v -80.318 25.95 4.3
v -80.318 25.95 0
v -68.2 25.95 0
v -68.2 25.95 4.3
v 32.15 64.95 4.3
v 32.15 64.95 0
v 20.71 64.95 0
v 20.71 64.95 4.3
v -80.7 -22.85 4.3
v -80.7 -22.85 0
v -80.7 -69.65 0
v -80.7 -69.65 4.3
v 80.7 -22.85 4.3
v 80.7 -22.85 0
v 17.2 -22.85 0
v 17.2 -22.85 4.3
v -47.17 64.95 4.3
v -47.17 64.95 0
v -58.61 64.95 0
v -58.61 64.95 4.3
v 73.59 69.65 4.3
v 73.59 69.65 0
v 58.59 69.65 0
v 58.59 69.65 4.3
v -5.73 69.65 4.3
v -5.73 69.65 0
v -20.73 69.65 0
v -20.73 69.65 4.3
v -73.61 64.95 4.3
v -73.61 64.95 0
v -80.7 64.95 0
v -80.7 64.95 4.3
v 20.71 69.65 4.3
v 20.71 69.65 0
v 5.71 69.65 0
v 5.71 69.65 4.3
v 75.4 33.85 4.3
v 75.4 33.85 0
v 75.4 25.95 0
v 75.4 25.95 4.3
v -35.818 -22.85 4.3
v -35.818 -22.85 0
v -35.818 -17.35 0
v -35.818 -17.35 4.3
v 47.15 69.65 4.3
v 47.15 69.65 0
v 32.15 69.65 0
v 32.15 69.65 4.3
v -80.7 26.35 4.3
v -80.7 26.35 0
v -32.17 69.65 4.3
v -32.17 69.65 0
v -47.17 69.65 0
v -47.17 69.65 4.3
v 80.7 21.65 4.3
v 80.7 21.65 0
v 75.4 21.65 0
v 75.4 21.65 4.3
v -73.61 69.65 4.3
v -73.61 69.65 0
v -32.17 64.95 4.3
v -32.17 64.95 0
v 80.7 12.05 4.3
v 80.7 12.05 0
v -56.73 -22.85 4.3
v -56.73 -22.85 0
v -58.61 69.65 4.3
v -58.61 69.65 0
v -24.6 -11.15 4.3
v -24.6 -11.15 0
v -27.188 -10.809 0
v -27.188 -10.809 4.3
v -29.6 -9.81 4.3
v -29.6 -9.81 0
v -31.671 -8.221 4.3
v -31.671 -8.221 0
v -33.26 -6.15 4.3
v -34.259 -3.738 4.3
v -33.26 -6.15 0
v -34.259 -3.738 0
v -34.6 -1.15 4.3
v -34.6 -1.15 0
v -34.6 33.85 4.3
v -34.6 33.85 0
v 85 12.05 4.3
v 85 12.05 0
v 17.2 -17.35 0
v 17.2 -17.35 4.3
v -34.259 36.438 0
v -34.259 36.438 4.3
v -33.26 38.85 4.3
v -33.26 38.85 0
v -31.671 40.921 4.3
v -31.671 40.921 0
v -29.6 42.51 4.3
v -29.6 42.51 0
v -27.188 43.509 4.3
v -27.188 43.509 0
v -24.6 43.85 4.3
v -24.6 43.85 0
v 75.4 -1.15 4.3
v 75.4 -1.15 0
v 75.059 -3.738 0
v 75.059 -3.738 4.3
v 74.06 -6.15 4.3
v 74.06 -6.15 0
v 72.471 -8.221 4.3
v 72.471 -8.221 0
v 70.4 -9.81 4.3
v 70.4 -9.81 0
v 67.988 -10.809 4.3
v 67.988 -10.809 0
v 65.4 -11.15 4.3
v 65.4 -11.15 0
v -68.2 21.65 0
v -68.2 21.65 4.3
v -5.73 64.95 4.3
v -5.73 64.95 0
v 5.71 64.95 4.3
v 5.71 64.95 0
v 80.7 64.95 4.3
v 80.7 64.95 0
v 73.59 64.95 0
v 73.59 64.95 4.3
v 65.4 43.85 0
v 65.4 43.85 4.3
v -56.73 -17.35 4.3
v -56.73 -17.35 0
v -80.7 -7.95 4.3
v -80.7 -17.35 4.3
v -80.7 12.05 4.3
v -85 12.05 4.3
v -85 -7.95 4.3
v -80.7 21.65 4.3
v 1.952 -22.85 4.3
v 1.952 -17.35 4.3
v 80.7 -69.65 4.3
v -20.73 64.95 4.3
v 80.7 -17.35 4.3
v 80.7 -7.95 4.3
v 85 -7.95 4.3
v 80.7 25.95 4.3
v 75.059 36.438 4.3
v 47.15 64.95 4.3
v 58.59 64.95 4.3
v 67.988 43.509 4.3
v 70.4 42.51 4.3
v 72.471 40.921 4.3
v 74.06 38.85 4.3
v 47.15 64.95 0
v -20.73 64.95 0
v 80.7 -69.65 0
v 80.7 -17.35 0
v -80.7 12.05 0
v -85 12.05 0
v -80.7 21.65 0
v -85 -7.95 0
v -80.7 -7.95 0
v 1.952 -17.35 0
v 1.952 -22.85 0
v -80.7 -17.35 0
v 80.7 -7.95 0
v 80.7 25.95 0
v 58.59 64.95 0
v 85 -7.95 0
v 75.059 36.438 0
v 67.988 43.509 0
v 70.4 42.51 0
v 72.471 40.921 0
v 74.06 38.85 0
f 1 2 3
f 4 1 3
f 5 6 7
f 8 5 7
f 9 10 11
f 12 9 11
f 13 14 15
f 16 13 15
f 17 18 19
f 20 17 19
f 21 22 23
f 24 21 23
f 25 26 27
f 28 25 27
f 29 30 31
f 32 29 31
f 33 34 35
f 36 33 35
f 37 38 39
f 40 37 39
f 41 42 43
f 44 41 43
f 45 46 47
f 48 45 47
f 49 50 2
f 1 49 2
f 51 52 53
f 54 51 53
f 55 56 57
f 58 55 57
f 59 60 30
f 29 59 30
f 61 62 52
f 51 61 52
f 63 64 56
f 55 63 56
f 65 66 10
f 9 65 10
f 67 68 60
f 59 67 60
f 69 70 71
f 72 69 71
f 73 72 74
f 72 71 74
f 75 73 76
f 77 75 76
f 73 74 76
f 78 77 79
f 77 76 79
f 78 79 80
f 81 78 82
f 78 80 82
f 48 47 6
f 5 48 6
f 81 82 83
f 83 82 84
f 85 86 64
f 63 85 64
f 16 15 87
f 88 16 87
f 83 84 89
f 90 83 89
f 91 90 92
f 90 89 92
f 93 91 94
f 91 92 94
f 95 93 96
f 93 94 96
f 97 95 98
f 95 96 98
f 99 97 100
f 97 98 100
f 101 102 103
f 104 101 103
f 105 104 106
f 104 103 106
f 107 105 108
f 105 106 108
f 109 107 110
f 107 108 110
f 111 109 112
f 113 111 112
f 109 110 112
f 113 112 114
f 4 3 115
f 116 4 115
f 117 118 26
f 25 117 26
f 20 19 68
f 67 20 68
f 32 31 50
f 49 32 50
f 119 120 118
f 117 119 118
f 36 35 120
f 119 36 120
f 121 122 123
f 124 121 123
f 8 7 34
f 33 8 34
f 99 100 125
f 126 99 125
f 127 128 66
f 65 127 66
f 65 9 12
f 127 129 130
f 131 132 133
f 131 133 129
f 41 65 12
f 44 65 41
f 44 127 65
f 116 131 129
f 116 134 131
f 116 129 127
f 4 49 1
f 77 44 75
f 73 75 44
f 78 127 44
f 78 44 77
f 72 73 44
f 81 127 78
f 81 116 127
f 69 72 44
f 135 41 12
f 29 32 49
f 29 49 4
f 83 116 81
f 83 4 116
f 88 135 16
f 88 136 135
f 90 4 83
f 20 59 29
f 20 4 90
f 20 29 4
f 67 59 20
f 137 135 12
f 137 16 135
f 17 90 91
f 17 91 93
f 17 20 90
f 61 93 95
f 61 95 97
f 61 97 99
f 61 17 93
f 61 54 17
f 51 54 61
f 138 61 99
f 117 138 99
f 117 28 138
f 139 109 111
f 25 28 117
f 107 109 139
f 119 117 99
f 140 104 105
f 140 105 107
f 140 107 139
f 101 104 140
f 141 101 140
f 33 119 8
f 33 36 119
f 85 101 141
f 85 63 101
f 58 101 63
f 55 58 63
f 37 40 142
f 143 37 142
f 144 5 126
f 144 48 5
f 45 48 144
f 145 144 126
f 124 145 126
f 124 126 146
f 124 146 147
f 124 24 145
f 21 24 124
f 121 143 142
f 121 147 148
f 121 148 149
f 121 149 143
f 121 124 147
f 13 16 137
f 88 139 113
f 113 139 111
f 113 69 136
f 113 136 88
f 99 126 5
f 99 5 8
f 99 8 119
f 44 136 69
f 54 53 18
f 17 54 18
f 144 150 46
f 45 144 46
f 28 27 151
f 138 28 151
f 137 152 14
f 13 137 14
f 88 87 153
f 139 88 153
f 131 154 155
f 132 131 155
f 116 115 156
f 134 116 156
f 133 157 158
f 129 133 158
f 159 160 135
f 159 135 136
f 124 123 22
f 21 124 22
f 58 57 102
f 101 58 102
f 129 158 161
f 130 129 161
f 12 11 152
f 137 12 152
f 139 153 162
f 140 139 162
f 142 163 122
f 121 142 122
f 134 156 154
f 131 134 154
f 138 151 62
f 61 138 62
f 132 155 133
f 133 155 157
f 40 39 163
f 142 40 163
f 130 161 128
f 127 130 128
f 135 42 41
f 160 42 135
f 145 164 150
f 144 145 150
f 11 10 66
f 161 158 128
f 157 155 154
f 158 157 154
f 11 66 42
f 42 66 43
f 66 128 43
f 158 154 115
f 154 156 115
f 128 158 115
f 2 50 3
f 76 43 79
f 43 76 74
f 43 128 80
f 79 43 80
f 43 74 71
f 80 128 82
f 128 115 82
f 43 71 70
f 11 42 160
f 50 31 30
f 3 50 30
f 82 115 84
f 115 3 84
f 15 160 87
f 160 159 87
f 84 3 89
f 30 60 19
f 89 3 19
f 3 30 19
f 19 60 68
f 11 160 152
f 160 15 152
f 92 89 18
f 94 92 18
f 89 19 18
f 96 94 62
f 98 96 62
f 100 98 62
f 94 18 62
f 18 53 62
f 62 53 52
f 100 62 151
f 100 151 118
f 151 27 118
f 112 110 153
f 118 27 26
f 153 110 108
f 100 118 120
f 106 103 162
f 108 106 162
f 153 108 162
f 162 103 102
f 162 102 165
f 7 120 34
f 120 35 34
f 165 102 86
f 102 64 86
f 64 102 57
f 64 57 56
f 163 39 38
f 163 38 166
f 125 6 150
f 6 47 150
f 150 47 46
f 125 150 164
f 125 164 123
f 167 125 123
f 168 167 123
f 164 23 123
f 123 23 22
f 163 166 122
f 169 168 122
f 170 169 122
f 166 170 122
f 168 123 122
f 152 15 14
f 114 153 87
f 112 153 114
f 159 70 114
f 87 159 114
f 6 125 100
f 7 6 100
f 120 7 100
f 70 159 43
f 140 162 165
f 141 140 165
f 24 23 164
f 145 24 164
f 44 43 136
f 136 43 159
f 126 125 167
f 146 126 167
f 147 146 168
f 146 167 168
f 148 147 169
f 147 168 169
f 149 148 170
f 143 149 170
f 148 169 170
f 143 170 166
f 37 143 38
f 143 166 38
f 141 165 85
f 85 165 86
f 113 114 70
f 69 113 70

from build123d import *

# Parameters (mm, degrees)
SKETCH2_W           = 37.77
SKETCH2_H           = 5.5
BOSS_EXTRUDE1_DEPTH = 4.3


with BuildPart() as part:
    # Sketch2 → Boss-Extrude1 (new body)
    with BuildSketch(Plane.XY):
        with BuildLine():
            Line((-58.61, 69.65), (-73.61, 69.65))
            Line((-73.61, 69.65), (-73.61, 64.95))
            Line((-73.61, 64.95), (-80.7, 64.95))
            Line((-80.7, 64.95), (-80.7, 26.35))
            Line((-80.7, 26.35), (-80.318, 25.95))
            Line((-80.318, 25.95), (-68.2, 25.95))
            Line((-68.2, 25.95), (-68.2, 21.65))
            Line((-68.2, 21.65), (-80.7, 21.65))
            Line((-80.7, 21.65), (-80.7, 12.05))
            Line((-80.7, 12.05), (-85, 12.05))
            Line((-85, 12.05), (-85, -7.95))
            Line((-85, -7.95), (-80.7, -7.95))
            Line((-80.7, -7.95), (-80.7, -17.35))
            Line((-80.7, -17.35), (-56.729583067, -17.35))
            Line((-56.729583067, -17.35), (-56.729583067, -22.85))
            Line((-56.729583067, -22.85), (-80.7, -22.85))
            Line((-80.7, -22.85), (-80.7, -69.65))
            Line((-80.7, -69.65), (80.7, -69.65))
            Line((80.7, -69.65), (80.7, -22.85))
            Line((80.7, -22.85), (17.2, -22.85))
            Line((17.2, -22.85), (17.2, -17.35))
            Line((17.2, -17.35), (80.7, -17.35))
            Line((80.7, -17.35), (80.7, -7.95))
            Line((80.7, -7.95), (85, -7.95))
            Line((85, -7.95), (85, 12.05))
            Line((85, 12.05), (80.7, 12.05))
            Line((80.7, 12.05), (80.7, 21.65))
            Line((80.7, 21.65), (80.282, 21.65))
            Line((80.282, 21.65), (75.4, 21.65))
            Line((75.4, 21.65), (75.4, -1.15))
            ThreePointArc((75.4, -1.15), (72.471067812, -8.221067812), (65.4, -11.15))
            Line((65.4, -11.15), (-24.6, -11.15))
            ThreePointArc((-24.6, -11.15), (-31.671067812, -8.221067812), (-34.6, -1.15))
            Line((-34.6, -1.15), (-34.6, 33.85))
            ThreePointArc((-34.6, 33.85), (-31.671067812, 40.921067812), (-24.6, 43.85))
            Line((-24.6, 43.85), (65.4, 43.85))
            ThreePointArc((65.4, 43.85), (72.471067812, 40.921067812), (75.4, 33.85))
            Line((75.4, 33.85), (75.4, 25.95))
            Line((75.4, 25.95), (79.9, 25.95))
            Line((79.9, 25.95), (80.7, 25.95))
            Line((80.7, 25.95), (80.7, 64.95))
            Line((80.7, 64.95), (73.59, 64.95))
            Line((73.59, 64.95), (73.59, 69.65))
            Line((73.59, 69.65), (58.59, 69.65))
            Line((58.59, 69.65), (58.59, 64.95))
            Line((58.59, 64.95), (47.15, 64.95))
            Line((47.15, 64.95), (47.15, 69.65))
            Line((47.15, 69.65), (32.15, 69.65))
            Line((32.15, 69.65), (32.15, 64.95))
            Line((32.15, 64.95), (20.71, 64.95))
            Line((20.71, 64.95), (20.71, 69.65))
            Line((20.71, 69.65), (5.71, 69.65))
            Line((5.71, 69.65), (5.71, 64.95))
            Line((5.71, 64.95), (-5.73, 64.95))
            Line((-5.73, 64.95), (-5.73, 69.65))
            Line((-5.73, 69.65), (-20.73, 69.65))
            Line((-20.73, 69.65), (-20.73, 64.95))
            Line((-20.73, 64.95), (-32.17, 64.95))
            Line((-32.17, 64.95), (-32.17, 69.65))
            Line((-32.17, 69.65), (-47.17, 69.65))
            Line((-47.17, 69.65), (-47.17, 64.95))
            Line((-47.17, 64.95), (-58.61, 64.95))
            Line((-58.61, 64.95), (-58.61, 69.65))
        make_face()
        with Locations((-16.933, -20.1)):
            Rectangle(SKETCH2_W, SKETCH2_H, mode=Mode.SUBTRACT)
    extrude(amount=BOSS_EXTRUDE1_DEPTH)


solid = part.part
